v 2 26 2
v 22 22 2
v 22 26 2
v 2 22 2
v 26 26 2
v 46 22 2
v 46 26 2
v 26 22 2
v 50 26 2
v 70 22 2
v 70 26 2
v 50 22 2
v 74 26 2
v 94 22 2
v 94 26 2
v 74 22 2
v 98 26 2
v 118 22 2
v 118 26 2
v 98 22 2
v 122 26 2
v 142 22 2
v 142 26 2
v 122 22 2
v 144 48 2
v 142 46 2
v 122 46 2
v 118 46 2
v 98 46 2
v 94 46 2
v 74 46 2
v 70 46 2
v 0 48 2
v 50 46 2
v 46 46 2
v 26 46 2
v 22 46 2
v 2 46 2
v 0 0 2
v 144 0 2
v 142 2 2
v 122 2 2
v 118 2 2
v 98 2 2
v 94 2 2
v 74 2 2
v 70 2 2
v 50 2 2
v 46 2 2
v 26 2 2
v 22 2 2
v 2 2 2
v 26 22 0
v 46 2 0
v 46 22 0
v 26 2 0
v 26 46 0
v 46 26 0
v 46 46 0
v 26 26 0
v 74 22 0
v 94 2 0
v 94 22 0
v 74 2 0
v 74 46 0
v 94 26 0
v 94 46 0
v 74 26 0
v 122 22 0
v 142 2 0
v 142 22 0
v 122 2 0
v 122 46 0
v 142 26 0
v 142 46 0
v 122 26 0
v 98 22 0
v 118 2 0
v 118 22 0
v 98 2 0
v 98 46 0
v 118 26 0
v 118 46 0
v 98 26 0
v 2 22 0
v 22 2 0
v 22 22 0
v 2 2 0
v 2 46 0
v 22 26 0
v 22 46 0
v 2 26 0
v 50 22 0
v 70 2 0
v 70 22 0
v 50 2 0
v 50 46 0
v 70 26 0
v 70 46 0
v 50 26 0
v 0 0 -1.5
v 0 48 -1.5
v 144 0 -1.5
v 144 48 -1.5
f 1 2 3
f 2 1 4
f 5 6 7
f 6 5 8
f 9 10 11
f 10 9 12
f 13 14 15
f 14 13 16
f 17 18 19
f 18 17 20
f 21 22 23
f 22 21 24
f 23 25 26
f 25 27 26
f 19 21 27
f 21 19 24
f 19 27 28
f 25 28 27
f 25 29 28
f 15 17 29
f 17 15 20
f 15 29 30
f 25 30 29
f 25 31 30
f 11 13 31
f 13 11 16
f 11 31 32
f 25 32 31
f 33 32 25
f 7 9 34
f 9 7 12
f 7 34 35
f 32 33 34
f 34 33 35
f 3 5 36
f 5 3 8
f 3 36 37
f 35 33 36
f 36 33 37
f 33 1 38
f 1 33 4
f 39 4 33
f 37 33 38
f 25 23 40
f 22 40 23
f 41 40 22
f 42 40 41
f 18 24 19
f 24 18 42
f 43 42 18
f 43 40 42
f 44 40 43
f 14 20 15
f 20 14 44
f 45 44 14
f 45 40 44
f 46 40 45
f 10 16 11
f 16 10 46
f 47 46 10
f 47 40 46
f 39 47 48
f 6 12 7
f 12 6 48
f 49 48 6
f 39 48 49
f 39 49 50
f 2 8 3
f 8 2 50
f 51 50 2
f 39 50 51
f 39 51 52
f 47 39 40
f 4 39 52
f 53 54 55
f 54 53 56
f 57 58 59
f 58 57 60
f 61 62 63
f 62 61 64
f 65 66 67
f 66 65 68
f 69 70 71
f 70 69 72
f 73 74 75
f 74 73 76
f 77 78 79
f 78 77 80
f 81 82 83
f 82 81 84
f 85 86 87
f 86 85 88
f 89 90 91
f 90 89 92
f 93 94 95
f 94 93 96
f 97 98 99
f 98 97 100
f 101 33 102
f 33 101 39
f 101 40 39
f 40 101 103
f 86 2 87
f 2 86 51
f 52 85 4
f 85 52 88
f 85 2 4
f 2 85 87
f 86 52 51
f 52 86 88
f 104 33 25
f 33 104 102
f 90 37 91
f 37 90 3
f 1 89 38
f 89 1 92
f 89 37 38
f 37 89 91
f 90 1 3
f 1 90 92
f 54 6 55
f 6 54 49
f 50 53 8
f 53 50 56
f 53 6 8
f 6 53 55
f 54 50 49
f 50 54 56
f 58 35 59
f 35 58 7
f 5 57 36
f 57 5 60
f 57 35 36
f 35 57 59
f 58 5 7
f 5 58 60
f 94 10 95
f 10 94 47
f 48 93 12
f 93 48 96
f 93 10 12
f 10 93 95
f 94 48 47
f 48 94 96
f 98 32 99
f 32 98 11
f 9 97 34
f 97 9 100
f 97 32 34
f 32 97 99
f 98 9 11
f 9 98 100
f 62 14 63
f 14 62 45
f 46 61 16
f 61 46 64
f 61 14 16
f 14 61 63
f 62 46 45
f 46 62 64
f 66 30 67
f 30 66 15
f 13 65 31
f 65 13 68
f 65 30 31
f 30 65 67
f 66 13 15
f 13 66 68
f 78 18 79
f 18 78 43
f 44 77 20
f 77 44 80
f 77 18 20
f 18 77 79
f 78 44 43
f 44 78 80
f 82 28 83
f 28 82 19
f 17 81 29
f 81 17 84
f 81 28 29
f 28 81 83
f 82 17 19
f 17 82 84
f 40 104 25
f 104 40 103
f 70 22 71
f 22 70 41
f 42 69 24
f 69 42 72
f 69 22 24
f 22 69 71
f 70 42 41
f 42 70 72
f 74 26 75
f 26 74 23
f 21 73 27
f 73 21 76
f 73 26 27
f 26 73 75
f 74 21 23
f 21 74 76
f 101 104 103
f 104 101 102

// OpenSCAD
$fn = 30;

bucket_height = 2;
bucket_size = 20;
numx = 6;
numy = 2;
frame = 2;

for (i=[0:numx-1]) for (j=[0:numy-1]) {
    translate([i*(bucket_size+2*frame),j*(bucket_size+2*frame),0])difference(){
        cube([bucket_size+2*frame,bucket_size+2*frame,bucket_height]);
        translate([frame,frame,-0.5])cube([bucket_size,bucket_size,bucket_height+1]);
    }
}
translate([0,0,-1.5])cube([numx*(bucket_size+2*frame),numy*(bucket_size+2*frame),1.5]);
